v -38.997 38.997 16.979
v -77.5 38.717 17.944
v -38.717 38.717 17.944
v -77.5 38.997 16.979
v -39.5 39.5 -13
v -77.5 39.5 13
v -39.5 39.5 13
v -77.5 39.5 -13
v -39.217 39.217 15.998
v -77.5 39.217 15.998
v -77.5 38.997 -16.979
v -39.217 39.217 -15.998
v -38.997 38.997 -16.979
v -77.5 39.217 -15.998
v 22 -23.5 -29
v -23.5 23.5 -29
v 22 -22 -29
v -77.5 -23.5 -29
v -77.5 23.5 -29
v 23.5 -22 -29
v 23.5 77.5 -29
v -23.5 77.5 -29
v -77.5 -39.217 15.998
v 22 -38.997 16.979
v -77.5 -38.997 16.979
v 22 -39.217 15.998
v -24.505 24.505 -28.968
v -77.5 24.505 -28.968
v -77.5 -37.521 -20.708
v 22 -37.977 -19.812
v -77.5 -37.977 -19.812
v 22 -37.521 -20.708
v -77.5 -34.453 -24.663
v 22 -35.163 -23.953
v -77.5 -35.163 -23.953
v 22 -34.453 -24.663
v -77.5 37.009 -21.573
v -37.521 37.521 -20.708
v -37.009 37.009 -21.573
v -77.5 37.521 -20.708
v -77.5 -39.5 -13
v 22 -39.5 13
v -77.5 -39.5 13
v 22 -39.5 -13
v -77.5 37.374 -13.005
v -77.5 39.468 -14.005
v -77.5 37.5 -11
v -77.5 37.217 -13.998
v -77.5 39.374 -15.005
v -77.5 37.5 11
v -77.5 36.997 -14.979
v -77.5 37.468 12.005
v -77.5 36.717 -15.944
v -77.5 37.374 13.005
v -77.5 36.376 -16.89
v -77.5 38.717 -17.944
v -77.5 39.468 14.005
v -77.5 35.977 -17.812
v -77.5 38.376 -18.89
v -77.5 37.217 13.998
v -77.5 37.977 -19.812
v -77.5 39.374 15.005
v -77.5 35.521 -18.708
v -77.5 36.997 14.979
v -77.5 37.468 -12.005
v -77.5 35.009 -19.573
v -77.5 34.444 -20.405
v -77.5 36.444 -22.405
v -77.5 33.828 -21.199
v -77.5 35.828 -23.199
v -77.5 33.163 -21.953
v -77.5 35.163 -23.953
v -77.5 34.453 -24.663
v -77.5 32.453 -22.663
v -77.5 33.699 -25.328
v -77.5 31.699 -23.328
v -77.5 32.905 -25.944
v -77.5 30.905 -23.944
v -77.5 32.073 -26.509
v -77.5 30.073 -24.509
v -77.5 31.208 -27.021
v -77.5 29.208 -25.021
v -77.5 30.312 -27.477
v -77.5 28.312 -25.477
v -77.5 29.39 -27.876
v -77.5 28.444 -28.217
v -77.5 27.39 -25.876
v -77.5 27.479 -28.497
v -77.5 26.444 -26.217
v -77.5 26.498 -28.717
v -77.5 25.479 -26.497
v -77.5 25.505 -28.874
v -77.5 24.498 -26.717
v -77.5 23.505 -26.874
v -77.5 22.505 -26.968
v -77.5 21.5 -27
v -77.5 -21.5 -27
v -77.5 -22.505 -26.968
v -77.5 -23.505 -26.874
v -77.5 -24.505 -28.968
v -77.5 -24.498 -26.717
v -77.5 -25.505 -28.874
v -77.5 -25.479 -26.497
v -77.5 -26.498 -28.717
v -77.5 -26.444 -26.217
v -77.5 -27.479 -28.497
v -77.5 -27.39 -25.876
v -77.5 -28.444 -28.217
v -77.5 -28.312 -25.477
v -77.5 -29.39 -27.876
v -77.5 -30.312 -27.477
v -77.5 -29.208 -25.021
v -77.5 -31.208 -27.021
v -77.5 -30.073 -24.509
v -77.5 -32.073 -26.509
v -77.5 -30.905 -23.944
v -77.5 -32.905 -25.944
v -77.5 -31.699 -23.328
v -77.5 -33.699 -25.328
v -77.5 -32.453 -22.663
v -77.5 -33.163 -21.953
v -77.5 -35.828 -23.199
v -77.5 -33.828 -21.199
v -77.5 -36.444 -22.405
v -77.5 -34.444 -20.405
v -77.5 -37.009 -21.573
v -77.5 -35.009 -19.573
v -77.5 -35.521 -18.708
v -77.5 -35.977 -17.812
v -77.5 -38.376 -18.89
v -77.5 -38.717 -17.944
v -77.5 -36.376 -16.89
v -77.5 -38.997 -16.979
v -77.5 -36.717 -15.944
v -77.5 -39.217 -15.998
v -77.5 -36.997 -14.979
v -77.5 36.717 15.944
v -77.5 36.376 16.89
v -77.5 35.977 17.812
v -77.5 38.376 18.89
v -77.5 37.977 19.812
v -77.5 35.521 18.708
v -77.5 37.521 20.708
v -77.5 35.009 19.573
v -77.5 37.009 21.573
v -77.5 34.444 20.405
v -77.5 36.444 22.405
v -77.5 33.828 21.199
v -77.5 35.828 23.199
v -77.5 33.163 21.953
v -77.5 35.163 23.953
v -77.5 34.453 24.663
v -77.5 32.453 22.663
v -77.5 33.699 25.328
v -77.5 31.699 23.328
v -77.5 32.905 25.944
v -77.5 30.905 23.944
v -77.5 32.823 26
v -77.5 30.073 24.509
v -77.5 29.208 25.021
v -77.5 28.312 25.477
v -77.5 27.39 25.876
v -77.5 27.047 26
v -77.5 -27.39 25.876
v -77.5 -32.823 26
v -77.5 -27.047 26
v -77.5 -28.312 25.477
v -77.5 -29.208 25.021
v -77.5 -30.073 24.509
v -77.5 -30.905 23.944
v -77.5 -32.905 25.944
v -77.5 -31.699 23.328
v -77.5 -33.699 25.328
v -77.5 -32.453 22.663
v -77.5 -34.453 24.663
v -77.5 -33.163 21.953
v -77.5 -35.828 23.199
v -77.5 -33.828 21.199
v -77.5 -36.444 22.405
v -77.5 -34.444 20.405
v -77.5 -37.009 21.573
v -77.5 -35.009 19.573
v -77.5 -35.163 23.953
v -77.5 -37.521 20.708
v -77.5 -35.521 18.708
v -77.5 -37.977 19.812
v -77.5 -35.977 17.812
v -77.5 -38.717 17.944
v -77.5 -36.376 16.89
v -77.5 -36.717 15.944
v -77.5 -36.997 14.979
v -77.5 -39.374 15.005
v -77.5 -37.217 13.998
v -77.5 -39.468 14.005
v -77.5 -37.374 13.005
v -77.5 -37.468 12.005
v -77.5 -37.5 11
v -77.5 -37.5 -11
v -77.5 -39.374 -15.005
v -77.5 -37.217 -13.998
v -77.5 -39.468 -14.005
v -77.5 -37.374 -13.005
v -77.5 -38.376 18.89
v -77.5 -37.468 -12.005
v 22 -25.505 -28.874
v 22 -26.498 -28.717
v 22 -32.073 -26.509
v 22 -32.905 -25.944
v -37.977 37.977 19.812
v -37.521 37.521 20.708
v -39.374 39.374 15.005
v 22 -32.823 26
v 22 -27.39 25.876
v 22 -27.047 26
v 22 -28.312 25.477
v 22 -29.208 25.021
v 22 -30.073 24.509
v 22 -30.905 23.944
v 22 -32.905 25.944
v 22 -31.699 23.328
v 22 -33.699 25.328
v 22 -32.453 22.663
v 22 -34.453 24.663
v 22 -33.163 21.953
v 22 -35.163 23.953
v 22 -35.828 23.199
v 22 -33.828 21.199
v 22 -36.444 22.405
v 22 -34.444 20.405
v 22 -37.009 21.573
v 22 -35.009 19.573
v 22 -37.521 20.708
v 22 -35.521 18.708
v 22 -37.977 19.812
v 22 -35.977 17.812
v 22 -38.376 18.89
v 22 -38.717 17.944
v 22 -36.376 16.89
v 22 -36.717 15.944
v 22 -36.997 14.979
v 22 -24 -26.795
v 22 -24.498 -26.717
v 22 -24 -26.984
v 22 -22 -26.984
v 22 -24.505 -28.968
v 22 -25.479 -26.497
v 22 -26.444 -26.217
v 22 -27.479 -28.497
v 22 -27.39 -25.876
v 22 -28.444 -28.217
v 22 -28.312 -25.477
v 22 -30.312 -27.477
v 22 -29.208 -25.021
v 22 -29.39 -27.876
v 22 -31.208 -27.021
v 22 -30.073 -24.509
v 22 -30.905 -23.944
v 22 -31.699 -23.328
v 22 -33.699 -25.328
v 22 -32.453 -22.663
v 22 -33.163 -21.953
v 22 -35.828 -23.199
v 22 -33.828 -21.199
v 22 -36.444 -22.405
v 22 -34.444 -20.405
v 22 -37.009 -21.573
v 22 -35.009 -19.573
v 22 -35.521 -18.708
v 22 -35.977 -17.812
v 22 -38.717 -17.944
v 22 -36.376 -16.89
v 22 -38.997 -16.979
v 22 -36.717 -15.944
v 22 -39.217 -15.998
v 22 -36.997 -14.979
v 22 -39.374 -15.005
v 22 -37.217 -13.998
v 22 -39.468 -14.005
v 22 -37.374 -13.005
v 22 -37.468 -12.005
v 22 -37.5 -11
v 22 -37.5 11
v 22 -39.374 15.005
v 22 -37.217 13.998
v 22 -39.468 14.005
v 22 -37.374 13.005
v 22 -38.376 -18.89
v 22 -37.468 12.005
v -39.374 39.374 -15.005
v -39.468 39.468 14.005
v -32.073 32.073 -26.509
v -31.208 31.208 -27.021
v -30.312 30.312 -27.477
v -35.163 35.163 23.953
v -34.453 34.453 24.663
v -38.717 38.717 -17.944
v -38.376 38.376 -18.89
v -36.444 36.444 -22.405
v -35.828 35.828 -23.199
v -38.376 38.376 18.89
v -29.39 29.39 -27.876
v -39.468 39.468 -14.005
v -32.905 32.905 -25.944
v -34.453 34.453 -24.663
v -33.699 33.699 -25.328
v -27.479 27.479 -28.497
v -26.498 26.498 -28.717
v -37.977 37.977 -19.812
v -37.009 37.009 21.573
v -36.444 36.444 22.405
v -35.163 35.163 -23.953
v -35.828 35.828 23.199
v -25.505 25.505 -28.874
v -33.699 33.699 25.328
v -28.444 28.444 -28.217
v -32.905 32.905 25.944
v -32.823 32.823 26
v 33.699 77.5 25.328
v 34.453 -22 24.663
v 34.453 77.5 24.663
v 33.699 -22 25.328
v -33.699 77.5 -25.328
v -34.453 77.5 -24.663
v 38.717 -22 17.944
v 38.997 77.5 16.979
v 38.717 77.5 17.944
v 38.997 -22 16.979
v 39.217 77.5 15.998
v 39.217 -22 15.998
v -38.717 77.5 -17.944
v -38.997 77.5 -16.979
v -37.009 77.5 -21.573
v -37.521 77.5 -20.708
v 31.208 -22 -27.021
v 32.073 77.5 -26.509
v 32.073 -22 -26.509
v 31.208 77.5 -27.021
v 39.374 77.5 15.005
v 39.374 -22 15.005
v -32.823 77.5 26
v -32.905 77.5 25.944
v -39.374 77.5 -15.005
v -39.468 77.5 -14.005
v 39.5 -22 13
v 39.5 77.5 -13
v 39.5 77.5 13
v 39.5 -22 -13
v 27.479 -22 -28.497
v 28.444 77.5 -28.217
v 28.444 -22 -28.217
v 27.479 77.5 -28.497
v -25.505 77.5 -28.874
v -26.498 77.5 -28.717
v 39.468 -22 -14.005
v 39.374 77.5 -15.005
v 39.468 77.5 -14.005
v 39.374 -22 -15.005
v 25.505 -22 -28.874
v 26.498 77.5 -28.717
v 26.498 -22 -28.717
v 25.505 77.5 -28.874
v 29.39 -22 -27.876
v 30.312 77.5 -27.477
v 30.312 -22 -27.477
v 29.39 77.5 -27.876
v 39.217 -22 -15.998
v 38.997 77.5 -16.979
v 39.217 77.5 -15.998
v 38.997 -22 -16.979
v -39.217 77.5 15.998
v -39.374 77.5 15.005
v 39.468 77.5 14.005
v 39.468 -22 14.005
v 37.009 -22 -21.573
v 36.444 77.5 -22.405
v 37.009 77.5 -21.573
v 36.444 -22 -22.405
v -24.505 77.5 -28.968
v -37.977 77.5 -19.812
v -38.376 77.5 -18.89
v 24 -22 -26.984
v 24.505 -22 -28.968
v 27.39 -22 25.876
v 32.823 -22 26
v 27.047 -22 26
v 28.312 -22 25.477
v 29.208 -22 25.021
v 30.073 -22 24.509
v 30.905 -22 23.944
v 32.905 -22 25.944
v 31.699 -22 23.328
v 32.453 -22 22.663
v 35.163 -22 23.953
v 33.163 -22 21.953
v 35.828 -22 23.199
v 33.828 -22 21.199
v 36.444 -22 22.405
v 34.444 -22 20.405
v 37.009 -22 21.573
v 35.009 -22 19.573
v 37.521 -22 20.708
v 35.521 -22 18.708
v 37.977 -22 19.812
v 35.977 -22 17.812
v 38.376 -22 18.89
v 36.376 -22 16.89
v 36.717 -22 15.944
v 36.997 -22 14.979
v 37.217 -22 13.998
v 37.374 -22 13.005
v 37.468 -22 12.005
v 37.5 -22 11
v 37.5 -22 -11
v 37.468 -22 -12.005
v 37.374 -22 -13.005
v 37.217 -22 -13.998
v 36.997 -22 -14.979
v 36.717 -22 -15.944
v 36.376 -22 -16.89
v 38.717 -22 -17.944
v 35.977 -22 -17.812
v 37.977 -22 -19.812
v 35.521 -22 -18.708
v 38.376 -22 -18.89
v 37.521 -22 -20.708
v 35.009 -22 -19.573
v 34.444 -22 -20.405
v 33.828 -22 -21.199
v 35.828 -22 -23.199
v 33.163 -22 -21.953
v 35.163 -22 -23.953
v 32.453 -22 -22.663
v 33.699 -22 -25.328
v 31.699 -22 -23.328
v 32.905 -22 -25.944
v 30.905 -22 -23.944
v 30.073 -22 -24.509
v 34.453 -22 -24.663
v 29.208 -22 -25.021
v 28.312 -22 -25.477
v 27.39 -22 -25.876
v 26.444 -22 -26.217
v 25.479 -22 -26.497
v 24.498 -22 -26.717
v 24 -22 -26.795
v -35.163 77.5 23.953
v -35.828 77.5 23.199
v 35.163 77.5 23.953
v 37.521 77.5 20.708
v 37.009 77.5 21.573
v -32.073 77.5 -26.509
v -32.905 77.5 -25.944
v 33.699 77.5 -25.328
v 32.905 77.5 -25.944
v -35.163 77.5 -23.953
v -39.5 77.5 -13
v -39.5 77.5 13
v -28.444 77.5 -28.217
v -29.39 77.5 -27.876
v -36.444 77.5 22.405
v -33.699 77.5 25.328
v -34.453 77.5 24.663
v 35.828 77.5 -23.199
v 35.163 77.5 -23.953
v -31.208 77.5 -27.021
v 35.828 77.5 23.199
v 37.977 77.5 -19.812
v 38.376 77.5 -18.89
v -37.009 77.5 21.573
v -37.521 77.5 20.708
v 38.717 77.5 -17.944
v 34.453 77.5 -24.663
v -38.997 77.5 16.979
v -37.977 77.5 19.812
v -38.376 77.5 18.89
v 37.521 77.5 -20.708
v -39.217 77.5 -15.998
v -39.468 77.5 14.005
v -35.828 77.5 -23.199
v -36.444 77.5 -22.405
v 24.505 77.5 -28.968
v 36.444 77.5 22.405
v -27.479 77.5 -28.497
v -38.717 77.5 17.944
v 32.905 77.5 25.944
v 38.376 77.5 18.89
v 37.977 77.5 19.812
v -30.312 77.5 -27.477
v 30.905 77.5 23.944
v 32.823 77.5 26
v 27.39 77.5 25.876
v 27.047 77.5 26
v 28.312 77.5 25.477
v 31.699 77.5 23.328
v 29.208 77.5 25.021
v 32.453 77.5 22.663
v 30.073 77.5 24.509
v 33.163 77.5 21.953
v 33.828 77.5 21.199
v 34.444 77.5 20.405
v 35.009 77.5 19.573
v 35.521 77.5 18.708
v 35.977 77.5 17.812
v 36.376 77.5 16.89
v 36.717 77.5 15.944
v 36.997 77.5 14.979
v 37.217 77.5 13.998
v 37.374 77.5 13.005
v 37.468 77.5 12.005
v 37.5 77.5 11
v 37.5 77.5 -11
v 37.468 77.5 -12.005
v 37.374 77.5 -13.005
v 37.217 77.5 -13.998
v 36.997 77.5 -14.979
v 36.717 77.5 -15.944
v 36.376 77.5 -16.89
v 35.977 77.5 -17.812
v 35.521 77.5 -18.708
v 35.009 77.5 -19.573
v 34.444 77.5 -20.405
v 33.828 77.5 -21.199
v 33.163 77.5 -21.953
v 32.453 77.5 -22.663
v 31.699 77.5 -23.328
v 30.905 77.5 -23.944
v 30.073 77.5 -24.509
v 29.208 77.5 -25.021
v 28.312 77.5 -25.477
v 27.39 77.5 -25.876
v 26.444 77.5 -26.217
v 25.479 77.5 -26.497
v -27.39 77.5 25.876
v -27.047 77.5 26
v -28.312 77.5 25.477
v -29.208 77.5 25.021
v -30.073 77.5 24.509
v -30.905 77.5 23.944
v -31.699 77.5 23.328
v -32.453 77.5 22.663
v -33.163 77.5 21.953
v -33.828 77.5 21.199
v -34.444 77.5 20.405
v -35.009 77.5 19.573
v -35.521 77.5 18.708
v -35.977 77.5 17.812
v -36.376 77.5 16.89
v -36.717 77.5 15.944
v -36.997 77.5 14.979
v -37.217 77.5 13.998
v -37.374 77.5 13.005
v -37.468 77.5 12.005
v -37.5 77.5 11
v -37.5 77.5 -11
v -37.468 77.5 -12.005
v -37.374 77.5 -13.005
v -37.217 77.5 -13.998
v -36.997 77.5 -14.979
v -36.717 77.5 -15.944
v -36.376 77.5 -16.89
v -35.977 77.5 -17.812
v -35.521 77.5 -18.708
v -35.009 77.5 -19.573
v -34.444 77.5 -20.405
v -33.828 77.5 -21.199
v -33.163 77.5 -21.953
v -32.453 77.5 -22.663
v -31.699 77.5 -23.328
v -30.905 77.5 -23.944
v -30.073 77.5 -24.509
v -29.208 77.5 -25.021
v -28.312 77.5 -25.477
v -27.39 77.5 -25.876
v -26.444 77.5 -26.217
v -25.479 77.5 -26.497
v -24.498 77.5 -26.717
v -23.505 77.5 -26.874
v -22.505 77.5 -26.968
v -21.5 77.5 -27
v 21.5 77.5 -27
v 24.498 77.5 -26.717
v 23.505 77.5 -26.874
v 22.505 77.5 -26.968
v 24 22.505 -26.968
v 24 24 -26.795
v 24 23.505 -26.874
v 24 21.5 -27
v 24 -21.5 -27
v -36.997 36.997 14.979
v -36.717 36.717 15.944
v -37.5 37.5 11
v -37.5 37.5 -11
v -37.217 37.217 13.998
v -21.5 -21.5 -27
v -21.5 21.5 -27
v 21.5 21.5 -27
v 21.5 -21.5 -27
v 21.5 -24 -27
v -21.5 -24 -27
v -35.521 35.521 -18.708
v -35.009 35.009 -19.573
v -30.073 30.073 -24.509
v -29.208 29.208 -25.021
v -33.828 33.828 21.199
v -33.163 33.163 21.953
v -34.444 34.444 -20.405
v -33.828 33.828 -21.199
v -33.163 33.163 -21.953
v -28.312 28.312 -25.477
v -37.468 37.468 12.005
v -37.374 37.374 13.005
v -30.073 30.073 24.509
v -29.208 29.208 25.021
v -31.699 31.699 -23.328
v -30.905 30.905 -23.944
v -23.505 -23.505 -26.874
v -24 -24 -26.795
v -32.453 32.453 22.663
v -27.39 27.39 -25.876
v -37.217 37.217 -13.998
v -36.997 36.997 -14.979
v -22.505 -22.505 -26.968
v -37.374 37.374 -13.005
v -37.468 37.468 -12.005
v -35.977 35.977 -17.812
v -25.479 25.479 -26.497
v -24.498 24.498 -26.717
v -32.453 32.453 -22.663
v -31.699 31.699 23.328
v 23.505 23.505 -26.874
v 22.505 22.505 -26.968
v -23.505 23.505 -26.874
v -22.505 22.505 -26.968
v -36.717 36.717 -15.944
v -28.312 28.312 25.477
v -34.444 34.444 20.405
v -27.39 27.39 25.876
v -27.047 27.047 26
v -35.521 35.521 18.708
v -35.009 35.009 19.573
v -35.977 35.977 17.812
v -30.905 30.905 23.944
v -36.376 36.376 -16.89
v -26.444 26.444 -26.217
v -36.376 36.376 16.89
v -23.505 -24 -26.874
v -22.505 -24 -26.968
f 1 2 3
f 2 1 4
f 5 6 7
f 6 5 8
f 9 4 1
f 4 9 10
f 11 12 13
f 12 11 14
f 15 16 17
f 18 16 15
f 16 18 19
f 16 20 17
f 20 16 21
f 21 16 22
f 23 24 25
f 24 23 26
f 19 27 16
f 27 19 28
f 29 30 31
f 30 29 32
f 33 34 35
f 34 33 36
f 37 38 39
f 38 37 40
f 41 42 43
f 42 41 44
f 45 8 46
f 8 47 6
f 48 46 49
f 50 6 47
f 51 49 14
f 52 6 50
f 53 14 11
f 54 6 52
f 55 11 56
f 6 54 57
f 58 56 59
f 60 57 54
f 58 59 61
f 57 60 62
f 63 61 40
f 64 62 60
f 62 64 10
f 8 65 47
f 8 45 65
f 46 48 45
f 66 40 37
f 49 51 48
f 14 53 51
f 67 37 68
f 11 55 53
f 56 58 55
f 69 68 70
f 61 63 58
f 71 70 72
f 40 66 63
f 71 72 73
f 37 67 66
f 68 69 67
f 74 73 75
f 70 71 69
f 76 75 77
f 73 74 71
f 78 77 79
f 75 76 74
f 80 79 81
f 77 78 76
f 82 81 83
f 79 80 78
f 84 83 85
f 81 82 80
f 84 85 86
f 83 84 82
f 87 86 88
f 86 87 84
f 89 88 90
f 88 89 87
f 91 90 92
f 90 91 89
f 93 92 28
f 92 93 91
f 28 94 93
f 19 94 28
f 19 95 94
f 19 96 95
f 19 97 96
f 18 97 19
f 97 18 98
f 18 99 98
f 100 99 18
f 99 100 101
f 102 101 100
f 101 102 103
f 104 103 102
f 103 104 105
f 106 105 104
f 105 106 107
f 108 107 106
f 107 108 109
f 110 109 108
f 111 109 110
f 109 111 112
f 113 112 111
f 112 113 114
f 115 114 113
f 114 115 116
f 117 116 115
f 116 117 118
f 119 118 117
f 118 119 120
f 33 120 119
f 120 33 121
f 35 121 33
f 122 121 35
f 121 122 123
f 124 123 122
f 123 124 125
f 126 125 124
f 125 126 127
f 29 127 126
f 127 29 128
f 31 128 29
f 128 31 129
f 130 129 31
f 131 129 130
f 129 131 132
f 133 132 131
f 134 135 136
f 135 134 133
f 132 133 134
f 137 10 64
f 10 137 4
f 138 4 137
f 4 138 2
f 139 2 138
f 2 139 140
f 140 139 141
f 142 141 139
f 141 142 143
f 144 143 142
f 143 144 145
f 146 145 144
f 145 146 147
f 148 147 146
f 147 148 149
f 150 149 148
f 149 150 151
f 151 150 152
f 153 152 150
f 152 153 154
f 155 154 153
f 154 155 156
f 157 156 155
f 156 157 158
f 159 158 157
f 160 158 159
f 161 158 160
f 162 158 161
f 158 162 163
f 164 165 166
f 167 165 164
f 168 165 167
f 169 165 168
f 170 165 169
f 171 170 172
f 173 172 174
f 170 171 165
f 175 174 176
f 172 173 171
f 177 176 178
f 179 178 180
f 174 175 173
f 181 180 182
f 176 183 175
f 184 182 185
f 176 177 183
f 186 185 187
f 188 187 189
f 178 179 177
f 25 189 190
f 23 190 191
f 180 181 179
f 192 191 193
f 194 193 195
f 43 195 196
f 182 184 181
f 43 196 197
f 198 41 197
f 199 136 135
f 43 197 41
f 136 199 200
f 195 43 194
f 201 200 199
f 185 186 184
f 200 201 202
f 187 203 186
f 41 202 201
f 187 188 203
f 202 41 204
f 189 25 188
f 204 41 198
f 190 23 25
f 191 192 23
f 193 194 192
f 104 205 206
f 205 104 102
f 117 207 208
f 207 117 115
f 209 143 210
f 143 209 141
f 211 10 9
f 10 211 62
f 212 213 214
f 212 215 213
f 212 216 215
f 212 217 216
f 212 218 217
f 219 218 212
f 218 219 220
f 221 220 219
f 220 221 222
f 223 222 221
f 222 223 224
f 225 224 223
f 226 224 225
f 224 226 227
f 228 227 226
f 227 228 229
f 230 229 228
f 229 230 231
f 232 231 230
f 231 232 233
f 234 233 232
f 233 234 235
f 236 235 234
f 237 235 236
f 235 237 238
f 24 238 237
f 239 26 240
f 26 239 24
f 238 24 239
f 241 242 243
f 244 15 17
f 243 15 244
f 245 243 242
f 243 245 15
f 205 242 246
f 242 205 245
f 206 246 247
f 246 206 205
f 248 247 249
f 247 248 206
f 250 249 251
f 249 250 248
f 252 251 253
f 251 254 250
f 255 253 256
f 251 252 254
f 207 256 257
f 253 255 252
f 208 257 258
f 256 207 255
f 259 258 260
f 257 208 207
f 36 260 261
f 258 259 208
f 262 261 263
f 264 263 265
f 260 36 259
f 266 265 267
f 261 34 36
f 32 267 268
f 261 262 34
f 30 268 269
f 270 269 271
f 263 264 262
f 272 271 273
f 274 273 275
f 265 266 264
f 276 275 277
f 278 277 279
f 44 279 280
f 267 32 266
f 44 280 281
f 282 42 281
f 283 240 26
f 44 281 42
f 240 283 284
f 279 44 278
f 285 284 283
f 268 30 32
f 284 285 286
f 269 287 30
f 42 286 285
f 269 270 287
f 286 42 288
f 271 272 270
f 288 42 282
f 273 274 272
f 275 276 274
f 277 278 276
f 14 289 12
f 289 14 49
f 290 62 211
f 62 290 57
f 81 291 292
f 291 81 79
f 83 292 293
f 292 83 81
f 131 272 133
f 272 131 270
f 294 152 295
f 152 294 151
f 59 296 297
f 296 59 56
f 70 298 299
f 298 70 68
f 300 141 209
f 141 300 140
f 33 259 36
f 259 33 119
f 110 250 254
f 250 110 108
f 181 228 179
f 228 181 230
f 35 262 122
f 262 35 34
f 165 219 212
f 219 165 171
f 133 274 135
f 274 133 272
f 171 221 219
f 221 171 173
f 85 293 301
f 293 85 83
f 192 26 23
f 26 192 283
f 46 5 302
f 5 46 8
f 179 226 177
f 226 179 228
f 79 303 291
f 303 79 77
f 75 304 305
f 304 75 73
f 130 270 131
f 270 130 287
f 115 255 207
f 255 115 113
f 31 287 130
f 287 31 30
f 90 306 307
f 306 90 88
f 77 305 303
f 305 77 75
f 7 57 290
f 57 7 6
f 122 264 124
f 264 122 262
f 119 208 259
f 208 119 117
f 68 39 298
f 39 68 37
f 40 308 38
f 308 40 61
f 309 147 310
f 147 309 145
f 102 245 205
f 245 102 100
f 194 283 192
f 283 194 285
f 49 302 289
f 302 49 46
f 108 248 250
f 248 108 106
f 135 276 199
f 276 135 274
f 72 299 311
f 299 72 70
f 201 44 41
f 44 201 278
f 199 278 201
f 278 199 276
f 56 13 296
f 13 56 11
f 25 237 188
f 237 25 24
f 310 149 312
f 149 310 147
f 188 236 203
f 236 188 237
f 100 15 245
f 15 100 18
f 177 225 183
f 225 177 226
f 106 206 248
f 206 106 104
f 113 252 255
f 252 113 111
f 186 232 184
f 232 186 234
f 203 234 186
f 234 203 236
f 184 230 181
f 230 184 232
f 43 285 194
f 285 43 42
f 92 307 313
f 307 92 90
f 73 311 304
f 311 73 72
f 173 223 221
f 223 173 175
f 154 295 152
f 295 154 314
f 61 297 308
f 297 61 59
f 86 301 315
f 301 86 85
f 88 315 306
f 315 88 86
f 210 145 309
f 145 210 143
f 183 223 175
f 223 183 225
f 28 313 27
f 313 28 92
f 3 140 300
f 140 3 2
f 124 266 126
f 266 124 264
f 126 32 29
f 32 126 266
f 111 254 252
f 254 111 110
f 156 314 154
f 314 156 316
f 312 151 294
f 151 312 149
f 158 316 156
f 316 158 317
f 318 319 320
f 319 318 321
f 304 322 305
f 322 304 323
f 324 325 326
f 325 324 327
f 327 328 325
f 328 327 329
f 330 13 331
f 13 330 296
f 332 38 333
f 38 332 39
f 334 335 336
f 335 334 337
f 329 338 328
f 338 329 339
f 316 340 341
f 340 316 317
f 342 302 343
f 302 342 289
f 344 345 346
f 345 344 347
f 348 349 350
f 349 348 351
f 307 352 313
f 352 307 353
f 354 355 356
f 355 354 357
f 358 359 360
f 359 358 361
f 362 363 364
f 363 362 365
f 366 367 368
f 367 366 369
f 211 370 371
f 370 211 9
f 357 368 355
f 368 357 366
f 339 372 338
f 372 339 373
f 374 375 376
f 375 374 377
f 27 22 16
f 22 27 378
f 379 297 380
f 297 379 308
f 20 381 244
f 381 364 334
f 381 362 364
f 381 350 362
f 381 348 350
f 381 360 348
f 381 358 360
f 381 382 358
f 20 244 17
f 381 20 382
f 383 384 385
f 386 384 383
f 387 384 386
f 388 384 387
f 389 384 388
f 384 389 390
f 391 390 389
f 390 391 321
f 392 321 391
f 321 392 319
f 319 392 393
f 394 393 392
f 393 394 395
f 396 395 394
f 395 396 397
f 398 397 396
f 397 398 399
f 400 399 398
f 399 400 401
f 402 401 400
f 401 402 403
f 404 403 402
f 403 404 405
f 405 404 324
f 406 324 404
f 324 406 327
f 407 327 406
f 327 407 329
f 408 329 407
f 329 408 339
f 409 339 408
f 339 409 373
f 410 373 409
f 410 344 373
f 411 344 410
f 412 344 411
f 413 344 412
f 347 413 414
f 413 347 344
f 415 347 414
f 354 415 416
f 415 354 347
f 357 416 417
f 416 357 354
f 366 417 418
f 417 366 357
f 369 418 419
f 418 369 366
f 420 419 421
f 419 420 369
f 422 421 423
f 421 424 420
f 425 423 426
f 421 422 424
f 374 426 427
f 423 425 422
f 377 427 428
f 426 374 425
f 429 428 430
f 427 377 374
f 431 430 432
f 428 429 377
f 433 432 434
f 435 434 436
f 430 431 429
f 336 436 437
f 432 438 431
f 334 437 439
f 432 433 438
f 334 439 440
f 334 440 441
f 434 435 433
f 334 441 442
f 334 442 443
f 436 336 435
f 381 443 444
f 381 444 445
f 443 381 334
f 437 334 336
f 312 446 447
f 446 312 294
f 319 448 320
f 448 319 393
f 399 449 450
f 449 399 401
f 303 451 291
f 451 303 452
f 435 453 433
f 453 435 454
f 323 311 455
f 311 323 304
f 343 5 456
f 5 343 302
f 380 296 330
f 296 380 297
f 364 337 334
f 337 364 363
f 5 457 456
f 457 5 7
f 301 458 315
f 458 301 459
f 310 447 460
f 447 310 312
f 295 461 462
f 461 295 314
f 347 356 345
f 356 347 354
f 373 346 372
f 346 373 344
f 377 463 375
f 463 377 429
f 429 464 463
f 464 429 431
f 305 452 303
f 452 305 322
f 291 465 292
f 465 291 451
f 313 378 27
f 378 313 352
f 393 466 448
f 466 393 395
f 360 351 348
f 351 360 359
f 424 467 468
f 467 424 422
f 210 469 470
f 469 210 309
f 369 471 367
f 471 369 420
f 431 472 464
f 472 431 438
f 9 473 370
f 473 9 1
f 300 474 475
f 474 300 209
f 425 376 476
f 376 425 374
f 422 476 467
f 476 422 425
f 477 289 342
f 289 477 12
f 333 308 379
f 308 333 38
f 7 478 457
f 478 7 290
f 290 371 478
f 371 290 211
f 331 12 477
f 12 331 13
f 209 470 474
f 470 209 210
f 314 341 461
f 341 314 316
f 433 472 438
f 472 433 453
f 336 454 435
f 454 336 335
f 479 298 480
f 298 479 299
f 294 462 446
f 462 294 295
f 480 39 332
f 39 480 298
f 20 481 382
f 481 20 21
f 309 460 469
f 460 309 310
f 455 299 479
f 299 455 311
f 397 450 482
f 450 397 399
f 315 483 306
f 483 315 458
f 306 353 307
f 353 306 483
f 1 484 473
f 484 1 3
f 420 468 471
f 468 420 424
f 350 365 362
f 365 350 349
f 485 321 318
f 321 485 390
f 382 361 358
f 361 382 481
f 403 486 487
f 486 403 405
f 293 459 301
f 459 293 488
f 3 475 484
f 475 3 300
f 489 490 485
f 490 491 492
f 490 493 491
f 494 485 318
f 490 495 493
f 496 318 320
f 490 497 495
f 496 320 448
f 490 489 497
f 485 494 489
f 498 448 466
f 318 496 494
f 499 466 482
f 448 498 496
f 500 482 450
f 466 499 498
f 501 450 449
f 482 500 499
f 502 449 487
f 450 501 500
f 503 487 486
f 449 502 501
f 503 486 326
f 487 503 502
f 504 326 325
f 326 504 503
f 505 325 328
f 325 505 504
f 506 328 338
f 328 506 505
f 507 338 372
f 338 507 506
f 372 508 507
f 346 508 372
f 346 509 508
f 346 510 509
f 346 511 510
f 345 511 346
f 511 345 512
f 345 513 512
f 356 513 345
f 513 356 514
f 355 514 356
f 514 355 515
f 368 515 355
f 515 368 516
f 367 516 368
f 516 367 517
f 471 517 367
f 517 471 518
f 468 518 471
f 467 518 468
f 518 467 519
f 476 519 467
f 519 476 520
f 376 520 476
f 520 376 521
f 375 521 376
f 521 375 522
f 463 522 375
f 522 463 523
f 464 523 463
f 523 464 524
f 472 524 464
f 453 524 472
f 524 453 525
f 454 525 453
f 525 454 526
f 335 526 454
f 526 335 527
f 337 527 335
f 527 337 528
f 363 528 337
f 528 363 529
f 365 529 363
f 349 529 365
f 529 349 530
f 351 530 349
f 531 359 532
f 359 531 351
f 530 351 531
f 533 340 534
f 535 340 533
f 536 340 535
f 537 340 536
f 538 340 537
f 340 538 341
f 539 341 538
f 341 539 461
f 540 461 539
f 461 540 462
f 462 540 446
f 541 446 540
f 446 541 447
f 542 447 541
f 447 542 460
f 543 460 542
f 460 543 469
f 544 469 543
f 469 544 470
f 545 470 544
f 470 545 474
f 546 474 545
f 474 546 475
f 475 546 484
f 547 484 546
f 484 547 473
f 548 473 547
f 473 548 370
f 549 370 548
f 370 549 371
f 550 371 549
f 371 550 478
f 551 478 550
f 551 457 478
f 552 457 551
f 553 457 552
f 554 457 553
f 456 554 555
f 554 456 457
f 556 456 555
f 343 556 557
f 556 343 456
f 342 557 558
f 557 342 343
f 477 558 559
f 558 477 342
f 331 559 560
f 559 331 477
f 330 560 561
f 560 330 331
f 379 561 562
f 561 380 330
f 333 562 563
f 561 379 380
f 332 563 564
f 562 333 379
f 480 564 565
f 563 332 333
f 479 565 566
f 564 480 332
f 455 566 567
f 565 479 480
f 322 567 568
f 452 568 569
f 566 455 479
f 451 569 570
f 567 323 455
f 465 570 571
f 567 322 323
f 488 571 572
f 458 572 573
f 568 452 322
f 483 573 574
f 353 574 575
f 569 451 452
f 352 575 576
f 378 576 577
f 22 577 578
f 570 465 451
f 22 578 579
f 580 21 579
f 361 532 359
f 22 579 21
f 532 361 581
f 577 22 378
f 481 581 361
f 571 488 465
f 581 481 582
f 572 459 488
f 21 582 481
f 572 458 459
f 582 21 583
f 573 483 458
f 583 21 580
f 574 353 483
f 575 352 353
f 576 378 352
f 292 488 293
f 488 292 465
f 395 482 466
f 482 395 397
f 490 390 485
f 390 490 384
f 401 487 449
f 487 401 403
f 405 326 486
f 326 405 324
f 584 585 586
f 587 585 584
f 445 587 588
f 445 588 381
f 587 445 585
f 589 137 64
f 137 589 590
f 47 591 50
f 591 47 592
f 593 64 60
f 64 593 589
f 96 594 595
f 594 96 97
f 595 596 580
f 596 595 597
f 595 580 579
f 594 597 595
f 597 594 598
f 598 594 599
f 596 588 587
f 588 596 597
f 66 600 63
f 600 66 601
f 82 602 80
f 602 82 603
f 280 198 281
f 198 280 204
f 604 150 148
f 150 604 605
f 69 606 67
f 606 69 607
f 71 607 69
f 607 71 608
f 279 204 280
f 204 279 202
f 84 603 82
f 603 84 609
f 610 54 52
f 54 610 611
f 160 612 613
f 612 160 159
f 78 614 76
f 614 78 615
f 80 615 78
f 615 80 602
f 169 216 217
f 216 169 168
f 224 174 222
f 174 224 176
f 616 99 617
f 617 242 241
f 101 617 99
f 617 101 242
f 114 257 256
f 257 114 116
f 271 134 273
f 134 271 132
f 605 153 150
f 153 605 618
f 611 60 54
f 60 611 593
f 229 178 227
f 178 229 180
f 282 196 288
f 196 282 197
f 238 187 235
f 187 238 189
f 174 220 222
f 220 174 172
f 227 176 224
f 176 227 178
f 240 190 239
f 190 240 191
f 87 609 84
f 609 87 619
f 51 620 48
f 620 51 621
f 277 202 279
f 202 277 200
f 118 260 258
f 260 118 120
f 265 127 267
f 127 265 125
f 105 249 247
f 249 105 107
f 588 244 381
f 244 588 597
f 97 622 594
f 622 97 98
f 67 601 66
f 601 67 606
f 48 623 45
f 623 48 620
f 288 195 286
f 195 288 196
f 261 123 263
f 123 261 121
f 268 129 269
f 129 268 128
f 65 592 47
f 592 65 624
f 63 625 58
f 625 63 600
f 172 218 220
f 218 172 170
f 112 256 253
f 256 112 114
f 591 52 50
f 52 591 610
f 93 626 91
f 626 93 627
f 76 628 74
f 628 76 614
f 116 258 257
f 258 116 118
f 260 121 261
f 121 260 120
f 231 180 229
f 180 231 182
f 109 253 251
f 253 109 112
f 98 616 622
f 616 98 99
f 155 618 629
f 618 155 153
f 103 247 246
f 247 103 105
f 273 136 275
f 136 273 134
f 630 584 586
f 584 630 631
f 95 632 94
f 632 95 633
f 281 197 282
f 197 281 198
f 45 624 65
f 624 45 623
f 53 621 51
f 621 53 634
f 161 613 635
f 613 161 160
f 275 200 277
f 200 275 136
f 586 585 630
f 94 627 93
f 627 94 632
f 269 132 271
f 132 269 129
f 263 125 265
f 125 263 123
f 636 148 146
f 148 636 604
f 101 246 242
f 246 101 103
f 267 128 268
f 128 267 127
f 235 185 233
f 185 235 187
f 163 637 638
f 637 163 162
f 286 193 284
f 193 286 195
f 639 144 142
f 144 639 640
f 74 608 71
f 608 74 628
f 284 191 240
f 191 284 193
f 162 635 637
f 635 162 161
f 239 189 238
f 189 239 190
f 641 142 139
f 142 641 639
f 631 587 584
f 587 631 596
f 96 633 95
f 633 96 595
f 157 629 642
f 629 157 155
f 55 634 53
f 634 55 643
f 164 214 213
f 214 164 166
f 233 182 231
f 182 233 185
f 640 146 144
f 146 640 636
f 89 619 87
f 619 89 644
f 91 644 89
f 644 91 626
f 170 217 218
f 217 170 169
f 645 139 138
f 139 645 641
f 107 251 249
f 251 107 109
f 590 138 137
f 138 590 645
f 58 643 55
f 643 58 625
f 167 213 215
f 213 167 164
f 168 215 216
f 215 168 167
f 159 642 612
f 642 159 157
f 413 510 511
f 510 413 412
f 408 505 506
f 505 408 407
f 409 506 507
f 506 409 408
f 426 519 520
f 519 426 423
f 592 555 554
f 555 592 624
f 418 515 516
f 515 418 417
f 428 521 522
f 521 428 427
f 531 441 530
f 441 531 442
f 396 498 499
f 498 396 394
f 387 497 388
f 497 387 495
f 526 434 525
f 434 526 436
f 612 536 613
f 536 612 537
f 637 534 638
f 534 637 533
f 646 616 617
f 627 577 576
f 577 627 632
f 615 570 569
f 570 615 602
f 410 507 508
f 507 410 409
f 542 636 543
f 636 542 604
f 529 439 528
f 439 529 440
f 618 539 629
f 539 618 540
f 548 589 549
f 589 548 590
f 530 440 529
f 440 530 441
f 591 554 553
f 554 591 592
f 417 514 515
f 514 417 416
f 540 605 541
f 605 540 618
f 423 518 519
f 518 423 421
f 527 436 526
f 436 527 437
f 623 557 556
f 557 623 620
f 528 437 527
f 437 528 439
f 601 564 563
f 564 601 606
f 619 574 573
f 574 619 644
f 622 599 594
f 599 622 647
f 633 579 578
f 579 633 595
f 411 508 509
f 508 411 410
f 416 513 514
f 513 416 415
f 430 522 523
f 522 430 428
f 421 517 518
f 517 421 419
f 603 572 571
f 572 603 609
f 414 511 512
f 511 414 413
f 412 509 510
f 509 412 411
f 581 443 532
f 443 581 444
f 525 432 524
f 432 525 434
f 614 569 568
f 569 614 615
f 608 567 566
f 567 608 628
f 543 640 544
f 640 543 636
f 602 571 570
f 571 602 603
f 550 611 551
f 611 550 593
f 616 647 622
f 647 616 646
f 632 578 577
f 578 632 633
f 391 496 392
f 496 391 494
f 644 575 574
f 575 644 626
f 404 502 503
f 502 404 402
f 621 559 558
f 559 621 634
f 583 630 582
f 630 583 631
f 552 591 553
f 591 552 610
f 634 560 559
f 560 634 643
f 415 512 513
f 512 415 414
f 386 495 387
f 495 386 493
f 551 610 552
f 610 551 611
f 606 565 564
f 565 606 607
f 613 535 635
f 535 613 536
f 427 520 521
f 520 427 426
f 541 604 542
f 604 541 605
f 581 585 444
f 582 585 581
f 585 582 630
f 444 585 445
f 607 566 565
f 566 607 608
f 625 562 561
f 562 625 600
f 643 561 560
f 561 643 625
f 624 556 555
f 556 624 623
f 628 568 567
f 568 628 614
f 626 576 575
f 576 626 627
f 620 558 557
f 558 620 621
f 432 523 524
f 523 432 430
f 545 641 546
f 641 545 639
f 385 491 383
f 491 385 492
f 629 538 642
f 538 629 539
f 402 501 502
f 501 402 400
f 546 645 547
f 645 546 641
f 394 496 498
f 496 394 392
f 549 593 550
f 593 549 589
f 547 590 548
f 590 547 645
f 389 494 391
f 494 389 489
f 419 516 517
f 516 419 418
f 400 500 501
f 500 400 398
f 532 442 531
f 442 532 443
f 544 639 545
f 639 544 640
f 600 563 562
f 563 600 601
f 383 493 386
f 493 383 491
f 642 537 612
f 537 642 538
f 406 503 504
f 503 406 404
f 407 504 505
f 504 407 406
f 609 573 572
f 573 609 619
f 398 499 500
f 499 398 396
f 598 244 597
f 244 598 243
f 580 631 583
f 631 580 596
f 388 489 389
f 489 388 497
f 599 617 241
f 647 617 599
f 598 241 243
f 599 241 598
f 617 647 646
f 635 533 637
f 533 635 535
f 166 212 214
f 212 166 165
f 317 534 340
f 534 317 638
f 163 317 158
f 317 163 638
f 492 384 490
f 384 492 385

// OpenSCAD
//$fs = 0.01;
//$fa = 0.01;
$fn = 100;
minkowski_circle = 16;
wallThickness = 4;
height = 155;

//outerwidth1 = 78;
//outerheight1 = 58;
//height1 = 110;
//wallThickness1 = wallThickness;

outerwidth2 = 79 - minkowski_circle;
outerheight2 = 58 - minkowski_circle;
wallThickness2 = wallThickness;
lip = 4;
outerWidthDownspout= 80.5 - minkowski_circle;
outerheightDownspout = 58 - minkowski_circle;

//endCapDownSpout();
L_Tube(outerwidth2,outerheight2,wallThickness2,height);

//endStop(outerWidthDownspout,outerheightDownspout,wallThickness2,lip);


module endCapDownSpout()
{
    rotate([0,270,0]) 
    endCap(outerWidthDownspout,outerheightDownspout,wallThickness2,lip);
}

module endCap(outerwidth2,outerheight2,wallThickness2,thickness)
{
    difference()
    {
        translate([-thickness,0,0])
        endStop(outerwidth2+thickness,outerheight2+thickness,wallThickness2, thickness*3);
        endStop(outerwidth2,outerheight2,wallThickness2,thickness*2);
    }
}

module endStop(outerwidth2,outerheight2,wallThickness2,thickness)
{
    //translate([-height/2,0,0])
    //rotate([0,0,90]) 
    rotate([90,0,90]) 
    solidTube(outerwidth2,outerheight2,wallThickness2,thickness); 
}

module T_Tube(outerwidth2,outerheight2,wallThickness2,height)
{
    difference()
    {
        union()
        {
            translate([-height/2,0,0])
            rotate([90,0,90]) 
            solidTube(outerwidth2,outerheight2,wallThickness2,height);
           
            translate([0,height/2,0])
            rotate([90,0,0]) 
            solidTube(outerwidth2,outerheight2,wallThickness2,height/2); 
        }
    
        union()
        {
            translate([-height/2-2,0,0])
            rotate([90,0,90]) 
            solidTube(outerwidth2-wallThickness,outerheight2-wallThickness,wallThickness,height+4);
           
            translate([0,height/2+2,0])
            rotate([90,0,0]) 
            solidTube(outerwidth2-wallThickness,outerheight2-wallThickness,wallThickness,height/2+4); 
        }
        
        translate([0,0,height/2+28])
        cube(height + 4, center = true);
        
    }
}

module L_Tube(outerwidth2,outerheight2,wallThickness2,height)
{
    difference()
    {
        thisHeight = height/2;
        thisOffset = 22;

        union()
        {
            translate([-thisHeight,0,0])
            rotate([90,0,90]) 
            solidTube(outerwidth2,outerheight2,wallThickness2,thisHeight+thisOffset);
           
            translate([0,thisHeight,0])
            rotate([90,0,0]) 
            solidTube(outerwidth2,outerheight2,wallThickness2,thisHeight+thisOffset); 
        }
    
        union()
        {
            translate([-thisHeight-2,0,0])
            rotate([90,0,90]) 
            solidTube(outerwidth2-wallThickness,outerheight2-wallThickness,wallThickness,thisHeight+thisOffset+4);
           
            translate([0,height/2+2,0])
            rotate([90,0,0]) 
            solidTube(outerwidth2-wallThickness,outerheight2-wallThickness,wallThickness,thisHeight+thisOffset+4); 
        }
        
        translate([0,0,thisHeight+28])
        cube(height + 4, center = true);
        
    }
}


module squareTube(outerwidth, outerheight, wallThickness, height)
{
    linear_extrude(height,true)
    difference()
    {
        minkowski()
        {
        square([outerwidth-minkowski_circle, outerheight-minkowski_circle],true);
            circle(minkowski_circle);
        }
        
        minkowski()
        {
        square([outerwidth-wallThickness-minkowski_circle,outerheight-wallThickness-minkowski_circle],true);
                        circle(minkowski_circle);
        }
    }
}

module solidTube(outerwidth, outerheight, wallThickness, height)
{
    linear_extrude(height,true)
    minkowski()
    {
        square([outerwidth-minkowski_circle, outerheight-minkowski_circle],true);
        circle(minkowski_circle);
    }
}
